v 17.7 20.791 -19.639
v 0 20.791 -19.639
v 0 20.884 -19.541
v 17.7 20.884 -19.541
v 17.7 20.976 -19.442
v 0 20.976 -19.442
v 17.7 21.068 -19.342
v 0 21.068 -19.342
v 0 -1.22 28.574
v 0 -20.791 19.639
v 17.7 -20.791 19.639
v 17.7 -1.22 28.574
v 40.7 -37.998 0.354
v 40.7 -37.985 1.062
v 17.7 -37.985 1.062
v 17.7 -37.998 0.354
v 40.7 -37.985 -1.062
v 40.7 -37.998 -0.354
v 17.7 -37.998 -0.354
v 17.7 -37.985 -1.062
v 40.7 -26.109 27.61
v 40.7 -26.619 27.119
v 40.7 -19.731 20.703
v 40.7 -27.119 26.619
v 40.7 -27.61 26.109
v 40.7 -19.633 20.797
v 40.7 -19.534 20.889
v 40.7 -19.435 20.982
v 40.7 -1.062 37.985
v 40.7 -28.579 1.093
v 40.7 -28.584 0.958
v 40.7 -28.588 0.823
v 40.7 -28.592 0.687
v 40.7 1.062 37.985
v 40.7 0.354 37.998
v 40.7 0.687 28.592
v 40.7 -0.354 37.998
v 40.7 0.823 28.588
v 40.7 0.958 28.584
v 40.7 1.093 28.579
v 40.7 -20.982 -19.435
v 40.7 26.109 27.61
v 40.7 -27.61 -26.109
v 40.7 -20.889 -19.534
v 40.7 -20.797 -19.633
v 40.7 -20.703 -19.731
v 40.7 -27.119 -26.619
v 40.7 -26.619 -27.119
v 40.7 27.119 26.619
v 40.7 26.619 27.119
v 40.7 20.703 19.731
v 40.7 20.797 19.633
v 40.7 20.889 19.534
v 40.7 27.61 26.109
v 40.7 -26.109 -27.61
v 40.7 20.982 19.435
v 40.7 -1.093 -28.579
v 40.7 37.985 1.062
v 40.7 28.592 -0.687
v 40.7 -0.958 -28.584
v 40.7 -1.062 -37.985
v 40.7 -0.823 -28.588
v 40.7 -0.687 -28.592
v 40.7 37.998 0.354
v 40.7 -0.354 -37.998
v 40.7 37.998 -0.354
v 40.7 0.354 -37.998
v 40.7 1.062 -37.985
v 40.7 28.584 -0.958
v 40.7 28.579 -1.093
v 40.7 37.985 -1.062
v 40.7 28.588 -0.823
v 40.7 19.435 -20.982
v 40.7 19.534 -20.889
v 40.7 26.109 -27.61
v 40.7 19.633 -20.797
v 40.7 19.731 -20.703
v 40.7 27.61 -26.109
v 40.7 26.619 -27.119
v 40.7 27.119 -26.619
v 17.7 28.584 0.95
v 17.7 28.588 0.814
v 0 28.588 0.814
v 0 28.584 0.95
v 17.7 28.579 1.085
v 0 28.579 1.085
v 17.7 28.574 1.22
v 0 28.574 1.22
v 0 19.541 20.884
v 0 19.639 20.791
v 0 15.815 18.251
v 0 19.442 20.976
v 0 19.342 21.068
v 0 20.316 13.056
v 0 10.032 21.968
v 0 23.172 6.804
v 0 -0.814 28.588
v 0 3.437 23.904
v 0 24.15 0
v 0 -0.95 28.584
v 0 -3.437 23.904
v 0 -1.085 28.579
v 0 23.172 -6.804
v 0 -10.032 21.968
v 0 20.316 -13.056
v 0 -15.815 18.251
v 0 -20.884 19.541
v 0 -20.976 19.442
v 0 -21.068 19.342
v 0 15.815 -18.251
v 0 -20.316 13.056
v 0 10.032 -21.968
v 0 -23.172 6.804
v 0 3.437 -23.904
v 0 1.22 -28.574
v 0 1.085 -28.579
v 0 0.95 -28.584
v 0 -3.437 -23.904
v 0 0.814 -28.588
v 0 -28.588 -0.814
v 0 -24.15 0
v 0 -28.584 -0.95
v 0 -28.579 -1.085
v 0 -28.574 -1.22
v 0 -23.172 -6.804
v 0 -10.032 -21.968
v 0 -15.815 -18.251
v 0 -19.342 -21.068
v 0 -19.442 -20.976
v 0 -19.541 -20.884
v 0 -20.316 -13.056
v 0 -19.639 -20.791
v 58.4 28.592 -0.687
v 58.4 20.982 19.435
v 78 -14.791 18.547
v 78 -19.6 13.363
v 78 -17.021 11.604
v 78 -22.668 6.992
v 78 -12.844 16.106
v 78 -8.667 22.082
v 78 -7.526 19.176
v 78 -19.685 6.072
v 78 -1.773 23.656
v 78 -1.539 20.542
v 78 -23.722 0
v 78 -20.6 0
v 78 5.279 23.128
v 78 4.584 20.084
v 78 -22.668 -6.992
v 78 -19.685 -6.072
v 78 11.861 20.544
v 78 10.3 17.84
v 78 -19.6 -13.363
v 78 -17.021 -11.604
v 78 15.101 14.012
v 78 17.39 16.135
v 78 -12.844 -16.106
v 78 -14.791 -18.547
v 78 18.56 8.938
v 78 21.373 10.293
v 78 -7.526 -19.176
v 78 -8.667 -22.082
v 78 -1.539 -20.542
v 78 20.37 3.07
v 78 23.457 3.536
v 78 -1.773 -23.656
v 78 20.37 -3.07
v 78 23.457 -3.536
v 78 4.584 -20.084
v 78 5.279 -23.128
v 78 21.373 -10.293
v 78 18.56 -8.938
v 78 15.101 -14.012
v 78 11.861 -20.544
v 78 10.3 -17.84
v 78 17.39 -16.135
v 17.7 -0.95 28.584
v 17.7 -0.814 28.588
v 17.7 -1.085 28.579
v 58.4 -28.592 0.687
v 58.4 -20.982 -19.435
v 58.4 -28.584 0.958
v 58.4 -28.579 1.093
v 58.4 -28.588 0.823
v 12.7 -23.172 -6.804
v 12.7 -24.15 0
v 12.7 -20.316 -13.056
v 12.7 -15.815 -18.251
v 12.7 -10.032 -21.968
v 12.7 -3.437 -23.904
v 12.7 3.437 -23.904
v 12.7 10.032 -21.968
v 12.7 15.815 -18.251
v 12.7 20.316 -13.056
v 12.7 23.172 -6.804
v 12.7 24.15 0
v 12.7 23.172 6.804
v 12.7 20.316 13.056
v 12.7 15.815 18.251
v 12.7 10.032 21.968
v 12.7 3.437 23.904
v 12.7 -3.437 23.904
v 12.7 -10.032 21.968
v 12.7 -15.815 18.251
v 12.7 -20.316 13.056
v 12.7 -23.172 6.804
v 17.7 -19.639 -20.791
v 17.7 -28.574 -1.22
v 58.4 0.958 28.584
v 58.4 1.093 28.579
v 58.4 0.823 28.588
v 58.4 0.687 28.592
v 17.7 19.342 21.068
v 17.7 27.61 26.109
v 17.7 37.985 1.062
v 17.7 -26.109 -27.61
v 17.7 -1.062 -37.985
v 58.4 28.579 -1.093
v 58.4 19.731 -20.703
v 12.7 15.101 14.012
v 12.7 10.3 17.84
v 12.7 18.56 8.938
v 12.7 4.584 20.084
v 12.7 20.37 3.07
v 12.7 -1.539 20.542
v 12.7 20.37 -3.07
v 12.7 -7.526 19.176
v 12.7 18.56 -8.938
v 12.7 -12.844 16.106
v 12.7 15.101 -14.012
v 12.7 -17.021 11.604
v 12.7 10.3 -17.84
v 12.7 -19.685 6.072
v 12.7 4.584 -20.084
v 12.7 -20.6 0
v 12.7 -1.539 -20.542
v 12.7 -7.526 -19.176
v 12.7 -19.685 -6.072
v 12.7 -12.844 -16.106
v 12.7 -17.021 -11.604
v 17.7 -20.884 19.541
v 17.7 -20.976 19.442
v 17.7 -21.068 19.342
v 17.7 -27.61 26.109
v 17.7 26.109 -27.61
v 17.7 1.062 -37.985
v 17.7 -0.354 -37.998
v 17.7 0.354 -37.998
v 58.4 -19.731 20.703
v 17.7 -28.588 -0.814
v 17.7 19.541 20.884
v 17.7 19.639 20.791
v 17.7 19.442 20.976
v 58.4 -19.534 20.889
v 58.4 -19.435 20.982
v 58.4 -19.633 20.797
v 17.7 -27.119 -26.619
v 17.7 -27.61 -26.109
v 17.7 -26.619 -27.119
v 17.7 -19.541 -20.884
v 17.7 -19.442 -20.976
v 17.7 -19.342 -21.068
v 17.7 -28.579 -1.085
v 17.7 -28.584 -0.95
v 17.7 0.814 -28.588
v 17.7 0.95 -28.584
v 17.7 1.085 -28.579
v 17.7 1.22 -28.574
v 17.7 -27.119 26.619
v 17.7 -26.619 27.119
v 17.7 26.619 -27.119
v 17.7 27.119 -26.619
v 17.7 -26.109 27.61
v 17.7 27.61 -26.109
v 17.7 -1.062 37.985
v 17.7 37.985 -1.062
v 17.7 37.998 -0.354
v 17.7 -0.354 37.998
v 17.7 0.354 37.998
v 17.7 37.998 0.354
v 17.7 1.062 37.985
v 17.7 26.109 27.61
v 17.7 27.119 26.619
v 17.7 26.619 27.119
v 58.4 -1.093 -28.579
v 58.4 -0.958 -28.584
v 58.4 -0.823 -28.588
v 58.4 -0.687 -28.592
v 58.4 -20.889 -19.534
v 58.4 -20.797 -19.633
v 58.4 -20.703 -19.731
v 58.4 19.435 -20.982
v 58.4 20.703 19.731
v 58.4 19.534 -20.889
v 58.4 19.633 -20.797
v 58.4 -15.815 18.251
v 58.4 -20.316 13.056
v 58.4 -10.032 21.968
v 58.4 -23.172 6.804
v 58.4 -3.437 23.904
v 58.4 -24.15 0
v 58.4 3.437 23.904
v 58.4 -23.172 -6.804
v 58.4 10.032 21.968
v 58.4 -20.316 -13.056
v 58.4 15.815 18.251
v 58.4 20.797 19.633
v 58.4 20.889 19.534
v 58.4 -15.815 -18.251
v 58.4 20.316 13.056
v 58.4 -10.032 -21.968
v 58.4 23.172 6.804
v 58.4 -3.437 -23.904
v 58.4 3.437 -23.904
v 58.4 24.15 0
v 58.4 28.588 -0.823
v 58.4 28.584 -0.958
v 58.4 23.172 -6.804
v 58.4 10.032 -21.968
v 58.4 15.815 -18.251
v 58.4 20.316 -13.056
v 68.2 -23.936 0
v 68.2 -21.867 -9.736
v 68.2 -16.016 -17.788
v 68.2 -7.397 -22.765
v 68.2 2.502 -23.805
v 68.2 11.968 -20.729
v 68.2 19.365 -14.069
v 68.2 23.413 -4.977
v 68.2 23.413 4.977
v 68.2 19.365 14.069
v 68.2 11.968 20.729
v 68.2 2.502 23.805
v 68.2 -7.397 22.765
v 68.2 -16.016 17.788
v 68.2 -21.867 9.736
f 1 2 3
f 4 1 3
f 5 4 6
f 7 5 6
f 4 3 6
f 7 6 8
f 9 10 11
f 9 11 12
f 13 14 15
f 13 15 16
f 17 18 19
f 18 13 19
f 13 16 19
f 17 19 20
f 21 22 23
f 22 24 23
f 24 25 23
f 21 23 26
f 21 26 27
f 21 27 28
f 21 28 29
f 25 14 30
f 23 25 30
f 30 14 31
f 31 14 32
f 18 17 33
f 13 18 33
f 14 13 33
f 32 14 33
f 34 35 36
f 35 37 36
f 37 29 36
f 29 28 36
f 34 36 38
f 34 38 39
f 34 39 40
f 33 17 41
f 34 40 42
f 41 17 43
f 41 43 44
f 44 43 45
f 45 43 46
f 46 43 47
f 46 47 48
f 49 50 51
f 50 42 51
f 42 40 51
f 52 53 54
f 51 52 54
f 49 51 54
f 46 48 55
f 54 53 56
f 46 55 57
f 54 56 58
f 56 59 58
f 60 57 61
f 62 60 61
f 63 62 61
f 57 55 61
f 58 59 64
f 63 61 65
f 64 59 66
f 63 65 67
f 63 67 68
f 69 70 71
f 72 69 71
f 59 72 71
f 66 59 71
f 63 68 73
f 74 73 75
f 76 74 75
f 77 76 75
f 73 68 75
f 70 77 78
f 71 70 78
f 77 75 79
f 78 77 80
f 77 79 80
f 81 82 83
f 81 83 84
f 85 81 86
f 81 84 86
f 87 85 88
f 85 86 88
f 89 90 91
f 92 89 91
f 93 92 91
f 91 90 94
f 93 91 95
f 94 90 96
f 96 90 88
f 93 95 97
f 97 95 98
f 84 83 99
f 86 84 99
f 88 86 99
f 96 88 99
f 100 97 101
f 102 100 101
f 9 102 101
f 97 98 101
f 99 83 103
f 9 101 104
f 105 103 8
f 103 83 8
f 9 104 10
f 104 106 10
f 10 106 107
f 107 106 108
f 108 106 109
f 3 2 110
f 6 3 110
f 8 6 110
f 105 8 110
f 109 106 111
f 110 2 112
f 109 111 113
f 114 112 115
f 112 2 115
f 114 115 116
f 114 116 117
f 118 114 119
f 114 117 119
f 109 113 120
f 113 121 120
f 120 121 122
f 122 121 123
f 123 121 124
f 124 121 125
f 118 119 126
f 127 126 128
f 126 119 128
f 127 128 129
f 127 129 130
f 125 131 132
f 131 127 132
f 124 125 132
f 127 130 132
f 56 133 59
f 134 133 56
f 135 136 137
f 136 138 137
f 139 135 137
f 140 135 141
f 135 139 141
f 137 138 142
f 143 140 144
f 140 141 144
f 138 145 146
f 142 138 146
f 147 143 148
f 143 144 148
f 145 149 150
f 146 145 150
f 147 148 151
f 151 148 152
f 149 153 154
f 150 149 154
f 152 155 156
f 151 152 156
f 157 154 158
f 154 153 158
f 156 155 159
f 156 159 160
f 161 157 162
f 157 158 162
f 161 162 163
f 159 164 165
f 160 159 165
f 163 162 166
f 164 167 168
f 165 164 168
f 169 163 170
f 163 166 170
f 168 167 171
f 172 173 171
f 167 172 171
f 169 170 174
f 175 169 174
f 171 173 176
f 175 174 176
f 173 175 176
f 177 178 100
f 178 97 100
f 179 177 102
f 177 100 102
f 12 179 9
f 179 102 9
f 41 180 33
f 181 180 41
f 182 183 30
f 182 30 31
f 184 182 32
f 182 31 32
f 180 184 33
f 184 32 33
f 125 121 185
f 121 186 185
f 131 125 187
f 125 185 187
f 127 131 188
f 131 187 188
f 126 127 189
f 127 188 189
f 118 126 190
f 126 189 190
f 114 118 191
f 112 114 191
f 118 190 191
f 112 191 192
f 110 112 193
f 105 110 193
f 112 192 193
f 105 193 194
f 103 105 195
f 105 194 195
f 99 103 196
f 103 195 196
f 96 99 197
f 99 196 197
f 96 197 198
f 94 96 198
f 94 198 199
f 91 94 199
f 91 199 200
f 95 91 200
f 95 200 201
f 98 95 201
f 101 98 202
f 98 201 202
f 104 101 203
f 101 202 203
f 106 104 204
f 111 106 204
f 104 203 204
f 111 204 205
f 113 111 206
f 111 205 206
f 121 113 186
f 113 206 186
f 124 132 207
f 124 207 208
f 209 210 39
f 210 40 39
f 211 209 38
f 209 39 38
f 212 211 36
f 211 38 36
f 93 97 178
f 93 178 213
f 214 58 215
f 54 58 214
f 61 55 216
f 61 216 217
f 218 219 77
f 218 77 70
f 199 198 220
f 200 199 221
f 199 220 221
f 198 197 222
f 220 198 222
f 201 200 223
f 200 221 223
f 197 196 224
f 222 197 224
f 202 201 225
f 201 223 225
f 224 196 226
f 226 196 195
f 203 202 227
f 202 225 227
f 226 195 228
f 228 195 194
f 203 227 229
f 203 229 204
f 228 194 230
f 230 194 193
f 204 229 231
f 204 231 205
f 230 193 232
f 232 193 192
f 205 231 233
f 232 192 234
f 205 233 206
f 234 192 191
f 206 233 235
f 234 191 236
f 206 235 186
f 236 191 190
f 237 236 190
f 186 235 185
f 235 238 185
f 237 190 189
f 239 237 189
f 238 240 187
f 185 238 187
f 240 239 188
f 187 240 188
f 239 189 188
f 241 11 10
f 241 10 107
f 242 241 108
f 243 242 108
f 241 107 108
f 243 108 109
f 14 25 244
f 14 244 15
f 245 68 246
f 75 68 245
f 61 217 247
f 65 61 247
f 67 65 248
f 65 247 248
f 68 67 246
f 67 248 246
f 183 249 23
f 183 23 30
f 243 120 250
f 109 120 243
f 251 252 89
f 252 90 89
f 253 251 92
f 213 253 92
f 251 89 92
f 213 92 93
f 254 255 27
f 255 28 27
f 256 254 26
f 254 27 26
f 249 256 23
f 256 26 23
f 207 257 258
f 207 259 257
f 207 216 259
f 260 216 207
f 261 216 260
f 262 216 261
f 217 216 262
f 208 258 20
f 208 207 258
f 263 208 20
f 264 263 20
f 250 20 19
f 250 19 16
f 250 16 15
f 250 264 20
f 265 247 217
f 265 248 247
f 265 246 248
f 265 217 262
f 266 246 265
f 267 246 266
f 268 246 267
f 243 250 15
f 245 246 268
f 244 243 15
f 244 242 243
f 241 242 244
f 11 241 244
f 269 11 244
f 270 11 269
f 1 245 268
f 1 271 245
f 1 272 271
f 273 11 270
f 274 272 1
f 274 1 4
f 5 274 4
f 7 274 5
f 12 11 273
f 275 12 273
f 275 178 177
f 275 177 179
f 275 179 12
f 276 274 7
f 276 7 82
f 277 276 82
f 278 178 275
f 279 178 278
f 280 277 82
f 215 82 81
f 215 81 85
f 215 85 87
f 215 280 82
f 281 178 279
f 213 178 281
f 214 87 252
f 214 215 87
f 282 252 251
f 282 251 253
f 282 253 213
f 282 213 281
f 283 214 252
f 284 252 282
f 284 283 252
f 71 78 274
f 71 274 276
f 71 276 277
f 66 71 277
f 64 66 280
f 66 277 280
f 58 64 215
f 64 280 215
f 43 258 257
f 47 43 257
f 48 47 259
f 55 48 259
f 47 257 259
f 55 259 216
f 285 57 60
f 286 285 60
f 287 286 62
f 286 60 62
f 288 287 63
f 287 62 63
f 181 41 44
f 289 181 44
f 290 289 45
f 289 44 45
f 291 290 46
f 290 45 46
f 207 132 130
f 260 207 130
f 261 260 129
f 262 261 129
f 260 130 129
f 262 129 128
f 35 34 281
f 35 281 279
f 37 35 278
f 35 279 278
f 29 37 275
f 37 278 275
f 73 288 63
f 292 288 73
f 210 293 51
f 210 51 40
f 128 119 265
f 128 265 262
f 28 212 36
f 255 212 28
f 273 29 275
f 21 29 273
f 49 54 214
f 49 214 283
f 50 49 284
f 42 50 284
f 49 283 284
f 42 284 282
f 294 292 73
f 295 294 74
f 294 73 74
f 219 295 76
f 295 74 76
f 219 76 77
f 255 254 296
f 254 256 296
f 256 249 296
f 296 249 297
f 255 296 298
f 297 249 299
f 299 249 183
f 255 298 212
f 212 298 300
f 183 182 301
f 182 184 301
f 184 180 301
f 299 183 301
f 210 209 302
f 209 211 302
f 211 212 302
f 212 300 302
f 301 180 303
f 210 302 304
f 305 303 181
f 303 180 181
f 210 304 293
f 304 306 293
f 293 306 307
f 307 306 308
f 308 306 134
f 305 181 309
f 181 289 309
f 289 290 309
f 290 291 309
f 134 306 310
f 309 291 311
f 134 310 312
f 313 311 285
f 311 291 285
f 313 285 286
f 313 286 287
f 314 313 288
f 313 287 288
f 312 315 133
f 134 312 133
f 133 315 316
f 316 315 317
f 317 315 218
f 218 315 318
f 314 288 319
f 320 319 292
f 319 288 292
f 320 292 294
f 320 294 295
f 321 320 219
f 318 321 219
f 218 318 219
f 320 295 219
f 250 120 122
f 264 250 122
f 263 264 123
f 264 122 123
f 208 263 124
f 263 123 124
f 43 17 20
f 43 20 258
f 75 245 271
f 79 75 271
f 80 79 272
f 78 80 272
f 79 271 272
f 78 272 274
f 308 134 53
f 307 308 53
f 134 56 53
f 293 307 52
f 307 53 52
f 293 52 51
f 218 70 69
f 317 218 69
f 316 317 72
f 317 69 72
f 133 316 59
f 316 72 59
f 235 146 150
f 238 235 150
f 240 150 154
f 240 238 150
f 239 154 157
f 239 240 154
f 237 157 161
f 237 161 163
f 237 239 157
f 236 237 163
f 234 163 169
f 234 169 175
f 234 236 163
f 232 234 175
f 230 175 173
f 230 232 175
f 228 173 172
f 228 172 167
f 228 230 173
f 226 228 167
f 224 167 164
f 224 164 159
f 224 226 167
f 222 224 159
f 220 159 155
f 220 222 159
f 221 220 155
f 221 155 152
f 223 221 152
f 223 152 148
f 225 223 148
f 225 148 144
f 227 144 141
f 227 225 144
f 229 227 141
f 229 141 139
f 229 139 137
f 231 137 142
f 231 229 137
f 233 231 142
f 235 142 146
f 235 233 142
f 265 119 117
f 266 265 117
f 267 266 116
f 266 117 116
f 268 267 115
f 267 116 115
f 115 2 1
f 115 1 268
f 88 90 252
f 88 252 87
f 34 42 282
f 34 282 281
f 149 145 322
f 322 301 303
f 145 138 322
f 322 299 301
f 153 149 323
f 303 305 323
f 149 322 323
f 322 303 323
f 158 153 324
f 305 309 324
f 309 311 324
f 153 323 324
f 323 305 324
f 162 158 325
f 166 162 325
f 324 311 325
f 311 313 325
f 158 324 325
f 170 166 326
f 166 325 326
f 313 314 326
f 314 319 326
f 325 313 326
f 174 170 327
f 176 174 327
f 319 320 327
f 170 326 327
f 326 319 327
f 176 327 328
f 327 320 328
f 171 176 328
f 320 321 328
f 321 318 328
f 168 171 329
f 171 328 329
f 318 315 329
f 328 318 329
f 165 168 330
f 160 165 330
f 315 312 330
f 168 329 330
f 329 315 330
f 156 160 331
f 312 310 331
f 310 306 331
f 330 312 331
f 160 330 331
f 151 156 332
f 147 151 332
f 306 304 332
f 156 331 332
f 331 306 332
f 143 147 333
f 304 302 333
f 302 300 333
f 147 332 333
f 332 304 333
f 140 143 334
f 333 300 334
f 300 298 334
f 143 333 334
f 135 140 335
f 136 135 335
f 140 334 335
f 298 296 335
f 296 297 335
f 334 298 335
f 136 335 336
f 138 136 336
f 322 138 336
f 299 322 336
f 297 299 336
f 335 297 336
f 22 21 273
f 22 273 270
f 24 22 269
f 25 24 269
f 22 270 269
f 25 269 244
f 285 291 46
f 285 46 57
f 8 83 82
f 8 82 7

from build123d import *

# Parameters (mm, degrees)
SKETCH2_R          = 66.009585634
CUT_EXTRUDE1_DEPTH = 23
SKETCH4_R          = 31.856181498
CUT_EXTRUDE2_DEPTH = 17.7
SKETCH5_R          = 32.987885215
CUT_EXTRUDE3_DEPTH = 17.7


with BuildPart() as part:
    # Sketch1 → Revolve1 (revolve)
    with BuildSketch(Plane.XY):
        Polygon((0, -24.15), (12.7, -24.15), (12.7, -20.6), (62.8, -20.6), (78, -20.6), (78, -23.722326479), (58.4, -24.15), (58.4, -28.6), (40.7, -28.6), (40.7, -38), (17.7, -38), (17.7, -28.6), (0, -28.6), align=None)
    revolve(axis=Axis((0, 0, 0), (1, 0, 0)))

    # Sketch2 → Cut-Extrude1 (cut)
    with BuildSketch(Plane(origin=(40.7, 0, 0), x_dir=(0, 0, -1), z_dir=(1, 0, 0))):
        Circle(SKETCH2_R)
        Polygon((0, 38.42492311), (-27.170523698, 27.170523698), (-38.42492311, 0), (-27.170523698, -27.170523698), (0, -38.42492311), (27.170523698, -27.170523698), (38.42492311, 0), (27.170523698, 27.170523698), align=None, mode=Mode.SUBTRACT)
    extrude(amount=-CUT_EXTRUDE1_DEPTH, mode=Mode.SUBTRACT)

    # Sketch4 → Cut-Extrude2 (cut)
    with BuildSketch(Plane.ZY):
        Circle(SKETCH4_R)
        Polygon((1.020288253, 28.665241383), (-19.547933824, 20.990839308), (-28.665241383, 1.020288253), (-20.990839308, -19.547933824), (-1.020288253, -28.665241383), (19.547933824, -20.990839308), (28.665241383, -1.020288253), (20.990839308, 19.547933824), align=None, mode=Mode.SUBTRACT)
    extrude(amount=-CUT_EXTRUDE2_DEPTH, mode=Mode.SUBTRACT)

    # Sketch5 → Cut-Extrude3 (cut)
    with BuildSketch(Plane(origin=(58.4, 0, 0), x_dir=(0, 0, -1), z_dir=(1, 0, 0))):
        Circle(SKETCH5_R)
        Polygon((0.892984101, 28.66948955), (-19.640955361, 20.903825587), (-28.66948955, 0.892984101), (-20.903825587, -19.640955361), (-0.892984101, -28.66948955), (19.640955361, -20.903825587), (28.66948955, -0.892984101), (20.903825587, 19.640955361), align=None, mode=Mode.SUBTRACT)
    extrude(amount=-CUT_EXTRUDE3_DEPTH, mode=Mode.SUBTRACT)


solid = part.part
